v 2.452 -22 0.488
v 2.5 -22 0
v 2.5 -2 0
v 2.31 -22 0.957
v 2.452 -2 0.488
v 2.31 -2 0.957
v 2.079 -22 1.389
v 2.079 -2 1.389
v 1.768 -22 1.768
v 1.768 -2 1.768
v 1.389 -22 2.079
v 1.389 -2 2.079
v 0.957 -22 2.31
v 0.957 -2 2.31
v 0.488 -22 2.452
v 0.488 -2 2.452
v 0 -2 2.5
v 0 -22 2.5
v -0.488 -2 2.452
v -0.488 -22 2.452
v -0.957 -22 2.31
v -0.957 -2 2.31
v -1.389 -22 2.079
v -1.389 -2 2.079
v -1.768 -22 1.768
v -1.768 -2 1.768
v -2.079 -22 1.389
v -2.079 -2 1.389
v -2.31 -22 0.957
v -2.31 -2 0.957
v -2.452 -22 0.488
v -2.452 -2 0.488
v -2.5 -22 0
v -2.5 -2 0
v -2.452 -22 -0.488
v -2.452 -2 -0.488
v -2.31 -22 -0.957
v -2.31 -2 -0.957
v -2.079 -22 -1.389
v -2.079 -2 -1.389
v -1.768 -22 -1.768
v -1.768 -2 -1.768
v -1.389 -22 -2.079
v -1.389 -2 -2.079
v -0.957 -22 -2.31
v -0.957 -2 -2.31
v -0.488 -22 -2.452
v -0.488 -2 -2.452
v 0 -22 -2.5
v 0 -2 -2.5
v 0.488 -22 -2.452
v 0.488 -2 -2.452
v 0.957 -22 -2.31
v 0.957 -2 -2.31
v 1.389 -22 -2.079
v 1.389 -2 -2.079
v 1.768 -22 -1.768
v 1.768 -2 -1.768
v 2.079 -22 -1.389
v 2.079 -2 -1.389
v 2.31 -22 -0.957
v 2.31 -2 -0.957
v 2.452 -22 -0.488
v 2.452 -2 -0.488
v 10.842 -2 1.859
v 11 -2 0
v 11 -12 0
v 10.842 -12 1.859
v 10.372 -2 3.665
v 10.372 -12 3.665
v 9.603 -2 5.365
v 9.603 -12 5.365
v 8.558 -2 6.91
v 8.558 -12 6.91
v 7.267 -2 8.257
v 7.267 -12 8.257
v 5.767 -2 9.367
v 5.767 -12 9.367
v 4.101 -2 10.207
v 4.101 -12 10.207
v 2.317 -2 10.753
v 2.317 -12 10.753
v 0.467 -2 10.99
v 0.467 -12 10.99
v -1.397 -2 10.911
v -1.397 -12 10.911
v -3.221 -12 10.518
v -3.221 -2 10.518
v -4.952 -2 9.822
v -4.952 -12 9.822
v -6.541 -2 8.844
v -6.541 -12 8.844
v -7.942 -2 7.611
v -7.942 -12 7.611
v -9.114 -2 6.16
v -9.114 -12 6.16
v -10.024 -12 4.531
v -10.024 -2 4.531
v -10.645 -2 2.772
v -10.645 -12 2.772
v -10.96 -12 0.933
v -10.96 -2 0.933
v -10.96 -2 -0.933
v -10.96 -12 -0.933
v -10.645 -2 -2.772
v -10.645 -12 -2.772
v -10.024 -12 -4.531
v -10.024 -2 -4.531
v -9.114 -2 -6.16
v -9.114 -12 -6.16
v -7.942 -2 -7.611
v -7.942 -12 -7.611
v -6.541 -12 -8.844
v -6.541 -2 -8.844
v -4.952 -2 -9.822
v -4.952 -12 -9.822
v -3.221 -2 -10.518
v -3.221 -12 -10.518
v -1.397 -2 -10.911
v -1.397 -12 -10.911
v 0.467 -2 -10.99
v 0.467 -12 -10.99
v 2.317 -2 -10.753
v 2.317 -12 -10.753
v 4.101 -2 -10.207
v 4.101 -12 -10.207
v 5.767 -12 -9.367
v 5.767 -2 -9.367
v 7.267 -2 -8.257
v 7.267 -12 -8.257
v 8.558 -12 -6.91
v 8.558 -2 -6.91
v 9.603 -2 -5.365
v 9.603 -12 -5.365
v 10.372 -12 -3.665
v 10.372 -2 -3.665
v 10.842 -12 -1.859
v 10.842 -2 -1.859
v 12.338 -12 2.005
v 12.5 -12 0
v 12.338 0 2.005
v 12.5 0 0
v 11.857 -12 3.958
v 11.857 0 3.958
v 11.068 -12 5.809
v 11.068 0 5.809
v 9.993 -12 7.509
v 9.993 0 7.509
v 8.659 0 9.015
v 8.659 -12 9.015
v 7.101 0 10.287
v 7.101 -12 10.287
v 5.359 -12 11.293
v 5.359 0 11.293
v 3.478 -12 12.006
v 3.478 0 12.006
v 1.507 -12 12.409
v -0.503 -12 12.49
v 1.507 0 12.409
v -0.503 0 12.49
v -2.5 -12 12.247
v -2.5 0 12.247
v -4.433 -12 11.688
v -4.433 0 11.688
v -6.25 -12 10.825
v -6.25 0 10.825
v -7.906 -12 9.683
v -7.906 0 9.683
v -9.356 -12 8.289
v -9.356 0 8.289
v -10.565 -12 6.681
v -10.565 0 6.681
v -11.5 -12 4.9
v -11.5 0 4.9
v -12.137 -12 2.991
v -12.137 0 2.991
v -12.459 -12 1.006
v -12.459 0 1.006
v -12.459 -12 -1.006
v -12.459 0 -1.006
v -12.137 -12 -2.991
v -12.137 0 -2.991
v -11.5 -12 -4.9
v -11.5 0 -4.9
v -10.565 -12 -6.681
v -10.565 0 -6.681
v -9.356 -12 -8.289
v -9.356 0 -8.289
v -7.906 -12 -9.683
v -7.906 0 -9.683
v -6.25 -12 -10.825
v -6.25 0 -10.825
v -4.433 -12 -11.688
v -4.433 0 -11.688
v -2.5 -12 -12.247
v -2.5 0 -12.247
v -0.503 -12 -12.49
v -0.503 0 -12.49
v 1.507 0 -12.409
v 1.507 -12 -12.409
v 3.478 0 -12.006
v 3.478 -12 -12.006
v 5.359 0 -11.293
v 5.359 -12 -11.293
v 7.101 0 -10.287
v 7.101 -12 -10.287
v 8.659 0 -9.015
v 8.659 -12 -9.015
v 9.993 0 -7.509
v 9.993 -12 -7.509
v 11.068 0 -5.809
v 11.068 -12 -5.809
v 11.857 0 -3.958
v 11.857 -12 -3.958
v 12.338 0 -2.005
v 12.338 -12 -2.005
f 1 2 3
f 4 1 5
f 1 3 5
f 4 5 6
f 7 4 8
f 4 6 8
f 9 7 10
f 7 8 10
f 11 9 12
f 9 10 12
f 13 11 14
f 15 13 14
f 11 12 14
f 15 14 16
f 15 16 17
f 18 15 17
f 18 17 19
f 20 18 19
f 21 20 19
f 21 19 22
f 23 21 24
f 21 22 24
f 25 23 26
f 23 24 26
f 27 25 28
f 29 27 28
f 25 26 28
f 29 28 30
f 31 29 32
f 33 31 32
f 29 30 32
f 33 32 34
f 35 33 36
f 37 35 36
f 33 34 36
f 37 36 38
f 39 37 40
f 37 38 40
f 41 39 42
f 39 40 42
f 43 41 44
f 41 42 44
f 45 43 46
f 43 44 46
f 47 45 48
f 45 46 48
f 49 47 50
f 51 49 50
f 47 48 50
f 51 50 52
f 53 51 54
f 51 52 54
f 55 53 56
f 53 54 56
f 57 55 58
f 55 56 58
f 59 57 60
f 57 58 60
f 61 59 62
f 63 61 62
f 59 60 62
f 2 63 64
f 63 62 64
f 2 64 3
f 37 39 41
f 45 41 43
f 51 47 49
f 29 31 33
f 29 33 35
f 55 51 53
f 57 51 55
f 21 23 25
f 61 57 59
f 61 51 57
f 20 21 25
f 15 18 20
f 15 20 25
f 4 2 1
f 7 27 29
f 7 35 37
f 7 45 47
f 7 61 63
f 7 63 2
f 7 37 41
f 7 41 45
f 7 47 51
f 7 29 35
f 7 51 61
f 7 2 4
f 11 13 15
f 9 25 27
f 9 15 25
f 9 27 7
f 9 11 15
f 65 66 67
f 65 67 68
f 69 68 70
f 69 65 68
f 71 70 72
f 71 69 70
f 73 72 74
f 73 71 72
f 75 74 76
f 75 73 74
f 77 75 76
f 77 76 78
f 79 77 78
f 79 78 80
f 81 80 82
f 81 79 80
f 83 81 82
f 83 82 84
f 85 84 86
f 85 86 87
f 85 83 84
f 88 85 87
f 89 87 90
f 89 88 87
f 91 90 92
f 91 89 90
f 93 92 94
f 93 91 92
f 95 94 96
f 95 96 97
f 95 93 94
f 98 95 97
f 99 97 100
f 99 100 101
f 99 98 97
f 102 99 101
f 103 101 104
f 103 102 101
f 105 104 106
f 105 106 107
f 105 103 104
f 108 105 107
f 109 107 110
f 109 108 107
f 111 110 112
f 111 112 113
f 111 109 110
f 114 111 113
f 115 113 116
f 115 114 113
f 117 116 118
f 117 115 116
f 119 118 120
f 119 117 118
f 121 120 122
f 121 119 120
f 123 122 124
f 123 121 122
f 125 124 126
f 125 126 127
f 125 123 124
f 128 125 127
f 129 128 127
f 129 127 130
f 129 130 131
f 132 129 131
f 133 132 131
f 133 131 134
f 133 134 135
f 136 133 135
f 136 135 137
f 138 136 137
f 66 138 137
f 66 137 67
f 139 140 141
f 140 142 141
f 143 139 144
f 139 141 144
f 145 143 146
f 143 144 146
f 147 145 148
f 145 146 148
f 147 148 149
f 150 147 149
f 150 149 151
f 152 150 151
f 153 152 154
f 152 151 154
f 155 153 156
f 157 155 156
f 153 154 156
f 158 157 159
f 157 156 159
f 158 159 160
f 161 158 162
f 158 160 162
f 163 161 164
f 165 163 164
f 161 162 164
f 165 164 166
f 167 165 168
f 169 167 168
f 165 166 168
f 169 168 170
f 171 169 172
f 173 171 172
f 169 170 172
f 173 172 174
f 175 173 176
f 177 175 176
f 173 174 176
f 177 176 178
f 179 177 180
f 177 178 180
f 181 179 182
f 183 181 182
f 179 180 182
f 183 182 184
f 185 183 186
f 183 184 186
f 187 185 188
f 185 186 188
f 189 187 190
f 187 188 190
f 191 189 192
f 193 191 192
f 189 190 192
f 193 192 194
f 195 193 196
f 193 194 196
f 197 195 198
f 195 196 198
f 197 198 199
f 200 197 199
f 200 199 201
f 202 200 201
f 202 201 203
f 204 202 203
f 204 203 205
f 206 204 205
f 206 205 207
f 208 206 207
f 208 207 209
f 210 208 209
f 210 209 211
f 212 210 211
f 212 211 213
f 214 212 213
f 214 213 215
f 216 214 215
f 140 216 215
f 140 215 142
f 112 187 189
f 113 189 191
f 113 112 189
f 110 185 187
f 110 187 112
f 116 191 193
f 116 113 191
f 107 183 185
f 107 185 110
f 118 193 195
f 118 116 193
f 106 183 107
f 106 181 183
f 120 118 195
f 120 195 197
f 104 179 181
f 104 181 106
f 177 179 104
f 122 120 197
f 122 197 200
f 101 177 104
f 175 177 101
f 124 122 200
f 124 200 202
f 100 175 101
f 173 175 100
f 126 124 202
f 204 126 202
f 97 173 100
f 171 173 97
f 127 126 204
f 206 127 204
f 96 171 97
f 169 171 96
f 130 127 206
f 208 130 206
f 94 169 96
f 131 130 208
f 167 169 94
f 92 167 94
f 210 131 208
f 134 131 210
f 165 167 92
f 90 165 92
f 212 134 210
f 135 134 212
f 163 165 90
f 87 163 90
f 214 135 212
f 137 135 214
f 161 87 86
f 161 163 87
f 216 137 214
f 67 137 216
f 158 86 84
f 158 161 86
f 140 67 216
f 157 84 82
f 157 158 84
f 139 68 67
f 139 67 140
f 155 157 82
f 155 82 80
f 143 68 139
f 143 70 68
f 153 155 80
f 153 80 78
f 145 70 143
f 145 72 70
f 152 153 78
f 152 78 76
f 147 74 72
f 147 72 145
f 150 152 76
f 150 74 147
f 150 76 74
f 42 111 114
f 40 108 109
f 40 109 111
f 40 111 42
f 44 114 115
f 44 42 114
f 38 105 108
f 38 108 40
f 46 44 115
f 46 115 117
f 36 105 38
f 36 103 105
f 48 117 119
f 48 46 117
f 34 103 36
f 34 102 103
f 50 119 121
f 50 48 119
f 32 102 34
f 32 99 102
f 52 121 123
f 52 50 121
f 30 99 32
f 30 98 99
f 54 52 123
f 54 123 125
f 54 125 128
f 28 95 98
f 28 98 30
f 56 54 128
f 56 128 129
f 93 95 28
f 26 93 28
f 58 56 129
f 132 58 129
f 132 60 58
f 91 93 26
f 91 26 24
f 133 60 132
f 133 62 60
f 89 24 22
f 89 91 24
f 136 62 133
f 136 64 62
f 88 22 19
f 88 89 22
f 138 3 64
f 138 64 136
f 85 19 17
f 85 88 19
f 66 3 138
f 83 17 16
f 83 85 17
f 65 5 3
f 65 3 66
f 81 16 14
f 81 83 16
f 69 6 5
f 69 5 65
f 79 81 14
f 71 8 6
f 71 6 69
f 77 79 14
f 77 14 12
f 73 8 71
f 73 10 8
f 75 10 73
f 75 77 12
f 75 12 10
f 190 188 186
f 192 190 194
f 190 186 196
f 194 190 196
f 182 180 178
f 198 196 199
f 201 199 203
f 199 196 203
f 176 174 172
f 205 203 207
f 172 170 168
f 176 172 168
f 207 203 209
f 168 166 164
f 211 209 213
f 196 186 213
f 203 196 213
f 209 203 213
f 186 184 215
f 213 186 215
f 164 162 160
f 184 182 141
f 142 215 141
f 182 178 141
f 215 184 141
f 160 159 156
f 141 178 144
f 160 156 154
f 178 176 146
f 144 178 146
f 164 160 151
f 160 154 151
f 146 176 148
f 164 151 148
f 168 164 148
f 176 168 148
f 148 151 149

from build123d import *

# Parameters (mm, degrees)
F0_R     = 12.5
F1_DEPTH = 2
F2_R     = 12.5
F2_R_2   = 11
F3_DEPTH = 10
F4_R     = 2.5
F5_DEPTH = 20


with BuildPart() as f1:
    # F0 (on Front) → F1 (new body)
    with BuildSketch(Plane.XZ):
        Circle(F0_R)
    extrude(amount=F1_DEPTH)

    # F2 (on face) → F3 (join)
    with BuildSketch(Plane.XZ.offset(2)):
        Circle(F2_R)
        Circle(F2_R_2, mode=Mode.SUBTRACT)
    extrude(amount=F3_DEPTH)

    # F4 (on face) → F5 (join)
    with BuildSketch(Plane.XZ.offset(2)):
        Circle(F4_R)
    extrude(amount=F5_DEPTH)


solid = f1.part
